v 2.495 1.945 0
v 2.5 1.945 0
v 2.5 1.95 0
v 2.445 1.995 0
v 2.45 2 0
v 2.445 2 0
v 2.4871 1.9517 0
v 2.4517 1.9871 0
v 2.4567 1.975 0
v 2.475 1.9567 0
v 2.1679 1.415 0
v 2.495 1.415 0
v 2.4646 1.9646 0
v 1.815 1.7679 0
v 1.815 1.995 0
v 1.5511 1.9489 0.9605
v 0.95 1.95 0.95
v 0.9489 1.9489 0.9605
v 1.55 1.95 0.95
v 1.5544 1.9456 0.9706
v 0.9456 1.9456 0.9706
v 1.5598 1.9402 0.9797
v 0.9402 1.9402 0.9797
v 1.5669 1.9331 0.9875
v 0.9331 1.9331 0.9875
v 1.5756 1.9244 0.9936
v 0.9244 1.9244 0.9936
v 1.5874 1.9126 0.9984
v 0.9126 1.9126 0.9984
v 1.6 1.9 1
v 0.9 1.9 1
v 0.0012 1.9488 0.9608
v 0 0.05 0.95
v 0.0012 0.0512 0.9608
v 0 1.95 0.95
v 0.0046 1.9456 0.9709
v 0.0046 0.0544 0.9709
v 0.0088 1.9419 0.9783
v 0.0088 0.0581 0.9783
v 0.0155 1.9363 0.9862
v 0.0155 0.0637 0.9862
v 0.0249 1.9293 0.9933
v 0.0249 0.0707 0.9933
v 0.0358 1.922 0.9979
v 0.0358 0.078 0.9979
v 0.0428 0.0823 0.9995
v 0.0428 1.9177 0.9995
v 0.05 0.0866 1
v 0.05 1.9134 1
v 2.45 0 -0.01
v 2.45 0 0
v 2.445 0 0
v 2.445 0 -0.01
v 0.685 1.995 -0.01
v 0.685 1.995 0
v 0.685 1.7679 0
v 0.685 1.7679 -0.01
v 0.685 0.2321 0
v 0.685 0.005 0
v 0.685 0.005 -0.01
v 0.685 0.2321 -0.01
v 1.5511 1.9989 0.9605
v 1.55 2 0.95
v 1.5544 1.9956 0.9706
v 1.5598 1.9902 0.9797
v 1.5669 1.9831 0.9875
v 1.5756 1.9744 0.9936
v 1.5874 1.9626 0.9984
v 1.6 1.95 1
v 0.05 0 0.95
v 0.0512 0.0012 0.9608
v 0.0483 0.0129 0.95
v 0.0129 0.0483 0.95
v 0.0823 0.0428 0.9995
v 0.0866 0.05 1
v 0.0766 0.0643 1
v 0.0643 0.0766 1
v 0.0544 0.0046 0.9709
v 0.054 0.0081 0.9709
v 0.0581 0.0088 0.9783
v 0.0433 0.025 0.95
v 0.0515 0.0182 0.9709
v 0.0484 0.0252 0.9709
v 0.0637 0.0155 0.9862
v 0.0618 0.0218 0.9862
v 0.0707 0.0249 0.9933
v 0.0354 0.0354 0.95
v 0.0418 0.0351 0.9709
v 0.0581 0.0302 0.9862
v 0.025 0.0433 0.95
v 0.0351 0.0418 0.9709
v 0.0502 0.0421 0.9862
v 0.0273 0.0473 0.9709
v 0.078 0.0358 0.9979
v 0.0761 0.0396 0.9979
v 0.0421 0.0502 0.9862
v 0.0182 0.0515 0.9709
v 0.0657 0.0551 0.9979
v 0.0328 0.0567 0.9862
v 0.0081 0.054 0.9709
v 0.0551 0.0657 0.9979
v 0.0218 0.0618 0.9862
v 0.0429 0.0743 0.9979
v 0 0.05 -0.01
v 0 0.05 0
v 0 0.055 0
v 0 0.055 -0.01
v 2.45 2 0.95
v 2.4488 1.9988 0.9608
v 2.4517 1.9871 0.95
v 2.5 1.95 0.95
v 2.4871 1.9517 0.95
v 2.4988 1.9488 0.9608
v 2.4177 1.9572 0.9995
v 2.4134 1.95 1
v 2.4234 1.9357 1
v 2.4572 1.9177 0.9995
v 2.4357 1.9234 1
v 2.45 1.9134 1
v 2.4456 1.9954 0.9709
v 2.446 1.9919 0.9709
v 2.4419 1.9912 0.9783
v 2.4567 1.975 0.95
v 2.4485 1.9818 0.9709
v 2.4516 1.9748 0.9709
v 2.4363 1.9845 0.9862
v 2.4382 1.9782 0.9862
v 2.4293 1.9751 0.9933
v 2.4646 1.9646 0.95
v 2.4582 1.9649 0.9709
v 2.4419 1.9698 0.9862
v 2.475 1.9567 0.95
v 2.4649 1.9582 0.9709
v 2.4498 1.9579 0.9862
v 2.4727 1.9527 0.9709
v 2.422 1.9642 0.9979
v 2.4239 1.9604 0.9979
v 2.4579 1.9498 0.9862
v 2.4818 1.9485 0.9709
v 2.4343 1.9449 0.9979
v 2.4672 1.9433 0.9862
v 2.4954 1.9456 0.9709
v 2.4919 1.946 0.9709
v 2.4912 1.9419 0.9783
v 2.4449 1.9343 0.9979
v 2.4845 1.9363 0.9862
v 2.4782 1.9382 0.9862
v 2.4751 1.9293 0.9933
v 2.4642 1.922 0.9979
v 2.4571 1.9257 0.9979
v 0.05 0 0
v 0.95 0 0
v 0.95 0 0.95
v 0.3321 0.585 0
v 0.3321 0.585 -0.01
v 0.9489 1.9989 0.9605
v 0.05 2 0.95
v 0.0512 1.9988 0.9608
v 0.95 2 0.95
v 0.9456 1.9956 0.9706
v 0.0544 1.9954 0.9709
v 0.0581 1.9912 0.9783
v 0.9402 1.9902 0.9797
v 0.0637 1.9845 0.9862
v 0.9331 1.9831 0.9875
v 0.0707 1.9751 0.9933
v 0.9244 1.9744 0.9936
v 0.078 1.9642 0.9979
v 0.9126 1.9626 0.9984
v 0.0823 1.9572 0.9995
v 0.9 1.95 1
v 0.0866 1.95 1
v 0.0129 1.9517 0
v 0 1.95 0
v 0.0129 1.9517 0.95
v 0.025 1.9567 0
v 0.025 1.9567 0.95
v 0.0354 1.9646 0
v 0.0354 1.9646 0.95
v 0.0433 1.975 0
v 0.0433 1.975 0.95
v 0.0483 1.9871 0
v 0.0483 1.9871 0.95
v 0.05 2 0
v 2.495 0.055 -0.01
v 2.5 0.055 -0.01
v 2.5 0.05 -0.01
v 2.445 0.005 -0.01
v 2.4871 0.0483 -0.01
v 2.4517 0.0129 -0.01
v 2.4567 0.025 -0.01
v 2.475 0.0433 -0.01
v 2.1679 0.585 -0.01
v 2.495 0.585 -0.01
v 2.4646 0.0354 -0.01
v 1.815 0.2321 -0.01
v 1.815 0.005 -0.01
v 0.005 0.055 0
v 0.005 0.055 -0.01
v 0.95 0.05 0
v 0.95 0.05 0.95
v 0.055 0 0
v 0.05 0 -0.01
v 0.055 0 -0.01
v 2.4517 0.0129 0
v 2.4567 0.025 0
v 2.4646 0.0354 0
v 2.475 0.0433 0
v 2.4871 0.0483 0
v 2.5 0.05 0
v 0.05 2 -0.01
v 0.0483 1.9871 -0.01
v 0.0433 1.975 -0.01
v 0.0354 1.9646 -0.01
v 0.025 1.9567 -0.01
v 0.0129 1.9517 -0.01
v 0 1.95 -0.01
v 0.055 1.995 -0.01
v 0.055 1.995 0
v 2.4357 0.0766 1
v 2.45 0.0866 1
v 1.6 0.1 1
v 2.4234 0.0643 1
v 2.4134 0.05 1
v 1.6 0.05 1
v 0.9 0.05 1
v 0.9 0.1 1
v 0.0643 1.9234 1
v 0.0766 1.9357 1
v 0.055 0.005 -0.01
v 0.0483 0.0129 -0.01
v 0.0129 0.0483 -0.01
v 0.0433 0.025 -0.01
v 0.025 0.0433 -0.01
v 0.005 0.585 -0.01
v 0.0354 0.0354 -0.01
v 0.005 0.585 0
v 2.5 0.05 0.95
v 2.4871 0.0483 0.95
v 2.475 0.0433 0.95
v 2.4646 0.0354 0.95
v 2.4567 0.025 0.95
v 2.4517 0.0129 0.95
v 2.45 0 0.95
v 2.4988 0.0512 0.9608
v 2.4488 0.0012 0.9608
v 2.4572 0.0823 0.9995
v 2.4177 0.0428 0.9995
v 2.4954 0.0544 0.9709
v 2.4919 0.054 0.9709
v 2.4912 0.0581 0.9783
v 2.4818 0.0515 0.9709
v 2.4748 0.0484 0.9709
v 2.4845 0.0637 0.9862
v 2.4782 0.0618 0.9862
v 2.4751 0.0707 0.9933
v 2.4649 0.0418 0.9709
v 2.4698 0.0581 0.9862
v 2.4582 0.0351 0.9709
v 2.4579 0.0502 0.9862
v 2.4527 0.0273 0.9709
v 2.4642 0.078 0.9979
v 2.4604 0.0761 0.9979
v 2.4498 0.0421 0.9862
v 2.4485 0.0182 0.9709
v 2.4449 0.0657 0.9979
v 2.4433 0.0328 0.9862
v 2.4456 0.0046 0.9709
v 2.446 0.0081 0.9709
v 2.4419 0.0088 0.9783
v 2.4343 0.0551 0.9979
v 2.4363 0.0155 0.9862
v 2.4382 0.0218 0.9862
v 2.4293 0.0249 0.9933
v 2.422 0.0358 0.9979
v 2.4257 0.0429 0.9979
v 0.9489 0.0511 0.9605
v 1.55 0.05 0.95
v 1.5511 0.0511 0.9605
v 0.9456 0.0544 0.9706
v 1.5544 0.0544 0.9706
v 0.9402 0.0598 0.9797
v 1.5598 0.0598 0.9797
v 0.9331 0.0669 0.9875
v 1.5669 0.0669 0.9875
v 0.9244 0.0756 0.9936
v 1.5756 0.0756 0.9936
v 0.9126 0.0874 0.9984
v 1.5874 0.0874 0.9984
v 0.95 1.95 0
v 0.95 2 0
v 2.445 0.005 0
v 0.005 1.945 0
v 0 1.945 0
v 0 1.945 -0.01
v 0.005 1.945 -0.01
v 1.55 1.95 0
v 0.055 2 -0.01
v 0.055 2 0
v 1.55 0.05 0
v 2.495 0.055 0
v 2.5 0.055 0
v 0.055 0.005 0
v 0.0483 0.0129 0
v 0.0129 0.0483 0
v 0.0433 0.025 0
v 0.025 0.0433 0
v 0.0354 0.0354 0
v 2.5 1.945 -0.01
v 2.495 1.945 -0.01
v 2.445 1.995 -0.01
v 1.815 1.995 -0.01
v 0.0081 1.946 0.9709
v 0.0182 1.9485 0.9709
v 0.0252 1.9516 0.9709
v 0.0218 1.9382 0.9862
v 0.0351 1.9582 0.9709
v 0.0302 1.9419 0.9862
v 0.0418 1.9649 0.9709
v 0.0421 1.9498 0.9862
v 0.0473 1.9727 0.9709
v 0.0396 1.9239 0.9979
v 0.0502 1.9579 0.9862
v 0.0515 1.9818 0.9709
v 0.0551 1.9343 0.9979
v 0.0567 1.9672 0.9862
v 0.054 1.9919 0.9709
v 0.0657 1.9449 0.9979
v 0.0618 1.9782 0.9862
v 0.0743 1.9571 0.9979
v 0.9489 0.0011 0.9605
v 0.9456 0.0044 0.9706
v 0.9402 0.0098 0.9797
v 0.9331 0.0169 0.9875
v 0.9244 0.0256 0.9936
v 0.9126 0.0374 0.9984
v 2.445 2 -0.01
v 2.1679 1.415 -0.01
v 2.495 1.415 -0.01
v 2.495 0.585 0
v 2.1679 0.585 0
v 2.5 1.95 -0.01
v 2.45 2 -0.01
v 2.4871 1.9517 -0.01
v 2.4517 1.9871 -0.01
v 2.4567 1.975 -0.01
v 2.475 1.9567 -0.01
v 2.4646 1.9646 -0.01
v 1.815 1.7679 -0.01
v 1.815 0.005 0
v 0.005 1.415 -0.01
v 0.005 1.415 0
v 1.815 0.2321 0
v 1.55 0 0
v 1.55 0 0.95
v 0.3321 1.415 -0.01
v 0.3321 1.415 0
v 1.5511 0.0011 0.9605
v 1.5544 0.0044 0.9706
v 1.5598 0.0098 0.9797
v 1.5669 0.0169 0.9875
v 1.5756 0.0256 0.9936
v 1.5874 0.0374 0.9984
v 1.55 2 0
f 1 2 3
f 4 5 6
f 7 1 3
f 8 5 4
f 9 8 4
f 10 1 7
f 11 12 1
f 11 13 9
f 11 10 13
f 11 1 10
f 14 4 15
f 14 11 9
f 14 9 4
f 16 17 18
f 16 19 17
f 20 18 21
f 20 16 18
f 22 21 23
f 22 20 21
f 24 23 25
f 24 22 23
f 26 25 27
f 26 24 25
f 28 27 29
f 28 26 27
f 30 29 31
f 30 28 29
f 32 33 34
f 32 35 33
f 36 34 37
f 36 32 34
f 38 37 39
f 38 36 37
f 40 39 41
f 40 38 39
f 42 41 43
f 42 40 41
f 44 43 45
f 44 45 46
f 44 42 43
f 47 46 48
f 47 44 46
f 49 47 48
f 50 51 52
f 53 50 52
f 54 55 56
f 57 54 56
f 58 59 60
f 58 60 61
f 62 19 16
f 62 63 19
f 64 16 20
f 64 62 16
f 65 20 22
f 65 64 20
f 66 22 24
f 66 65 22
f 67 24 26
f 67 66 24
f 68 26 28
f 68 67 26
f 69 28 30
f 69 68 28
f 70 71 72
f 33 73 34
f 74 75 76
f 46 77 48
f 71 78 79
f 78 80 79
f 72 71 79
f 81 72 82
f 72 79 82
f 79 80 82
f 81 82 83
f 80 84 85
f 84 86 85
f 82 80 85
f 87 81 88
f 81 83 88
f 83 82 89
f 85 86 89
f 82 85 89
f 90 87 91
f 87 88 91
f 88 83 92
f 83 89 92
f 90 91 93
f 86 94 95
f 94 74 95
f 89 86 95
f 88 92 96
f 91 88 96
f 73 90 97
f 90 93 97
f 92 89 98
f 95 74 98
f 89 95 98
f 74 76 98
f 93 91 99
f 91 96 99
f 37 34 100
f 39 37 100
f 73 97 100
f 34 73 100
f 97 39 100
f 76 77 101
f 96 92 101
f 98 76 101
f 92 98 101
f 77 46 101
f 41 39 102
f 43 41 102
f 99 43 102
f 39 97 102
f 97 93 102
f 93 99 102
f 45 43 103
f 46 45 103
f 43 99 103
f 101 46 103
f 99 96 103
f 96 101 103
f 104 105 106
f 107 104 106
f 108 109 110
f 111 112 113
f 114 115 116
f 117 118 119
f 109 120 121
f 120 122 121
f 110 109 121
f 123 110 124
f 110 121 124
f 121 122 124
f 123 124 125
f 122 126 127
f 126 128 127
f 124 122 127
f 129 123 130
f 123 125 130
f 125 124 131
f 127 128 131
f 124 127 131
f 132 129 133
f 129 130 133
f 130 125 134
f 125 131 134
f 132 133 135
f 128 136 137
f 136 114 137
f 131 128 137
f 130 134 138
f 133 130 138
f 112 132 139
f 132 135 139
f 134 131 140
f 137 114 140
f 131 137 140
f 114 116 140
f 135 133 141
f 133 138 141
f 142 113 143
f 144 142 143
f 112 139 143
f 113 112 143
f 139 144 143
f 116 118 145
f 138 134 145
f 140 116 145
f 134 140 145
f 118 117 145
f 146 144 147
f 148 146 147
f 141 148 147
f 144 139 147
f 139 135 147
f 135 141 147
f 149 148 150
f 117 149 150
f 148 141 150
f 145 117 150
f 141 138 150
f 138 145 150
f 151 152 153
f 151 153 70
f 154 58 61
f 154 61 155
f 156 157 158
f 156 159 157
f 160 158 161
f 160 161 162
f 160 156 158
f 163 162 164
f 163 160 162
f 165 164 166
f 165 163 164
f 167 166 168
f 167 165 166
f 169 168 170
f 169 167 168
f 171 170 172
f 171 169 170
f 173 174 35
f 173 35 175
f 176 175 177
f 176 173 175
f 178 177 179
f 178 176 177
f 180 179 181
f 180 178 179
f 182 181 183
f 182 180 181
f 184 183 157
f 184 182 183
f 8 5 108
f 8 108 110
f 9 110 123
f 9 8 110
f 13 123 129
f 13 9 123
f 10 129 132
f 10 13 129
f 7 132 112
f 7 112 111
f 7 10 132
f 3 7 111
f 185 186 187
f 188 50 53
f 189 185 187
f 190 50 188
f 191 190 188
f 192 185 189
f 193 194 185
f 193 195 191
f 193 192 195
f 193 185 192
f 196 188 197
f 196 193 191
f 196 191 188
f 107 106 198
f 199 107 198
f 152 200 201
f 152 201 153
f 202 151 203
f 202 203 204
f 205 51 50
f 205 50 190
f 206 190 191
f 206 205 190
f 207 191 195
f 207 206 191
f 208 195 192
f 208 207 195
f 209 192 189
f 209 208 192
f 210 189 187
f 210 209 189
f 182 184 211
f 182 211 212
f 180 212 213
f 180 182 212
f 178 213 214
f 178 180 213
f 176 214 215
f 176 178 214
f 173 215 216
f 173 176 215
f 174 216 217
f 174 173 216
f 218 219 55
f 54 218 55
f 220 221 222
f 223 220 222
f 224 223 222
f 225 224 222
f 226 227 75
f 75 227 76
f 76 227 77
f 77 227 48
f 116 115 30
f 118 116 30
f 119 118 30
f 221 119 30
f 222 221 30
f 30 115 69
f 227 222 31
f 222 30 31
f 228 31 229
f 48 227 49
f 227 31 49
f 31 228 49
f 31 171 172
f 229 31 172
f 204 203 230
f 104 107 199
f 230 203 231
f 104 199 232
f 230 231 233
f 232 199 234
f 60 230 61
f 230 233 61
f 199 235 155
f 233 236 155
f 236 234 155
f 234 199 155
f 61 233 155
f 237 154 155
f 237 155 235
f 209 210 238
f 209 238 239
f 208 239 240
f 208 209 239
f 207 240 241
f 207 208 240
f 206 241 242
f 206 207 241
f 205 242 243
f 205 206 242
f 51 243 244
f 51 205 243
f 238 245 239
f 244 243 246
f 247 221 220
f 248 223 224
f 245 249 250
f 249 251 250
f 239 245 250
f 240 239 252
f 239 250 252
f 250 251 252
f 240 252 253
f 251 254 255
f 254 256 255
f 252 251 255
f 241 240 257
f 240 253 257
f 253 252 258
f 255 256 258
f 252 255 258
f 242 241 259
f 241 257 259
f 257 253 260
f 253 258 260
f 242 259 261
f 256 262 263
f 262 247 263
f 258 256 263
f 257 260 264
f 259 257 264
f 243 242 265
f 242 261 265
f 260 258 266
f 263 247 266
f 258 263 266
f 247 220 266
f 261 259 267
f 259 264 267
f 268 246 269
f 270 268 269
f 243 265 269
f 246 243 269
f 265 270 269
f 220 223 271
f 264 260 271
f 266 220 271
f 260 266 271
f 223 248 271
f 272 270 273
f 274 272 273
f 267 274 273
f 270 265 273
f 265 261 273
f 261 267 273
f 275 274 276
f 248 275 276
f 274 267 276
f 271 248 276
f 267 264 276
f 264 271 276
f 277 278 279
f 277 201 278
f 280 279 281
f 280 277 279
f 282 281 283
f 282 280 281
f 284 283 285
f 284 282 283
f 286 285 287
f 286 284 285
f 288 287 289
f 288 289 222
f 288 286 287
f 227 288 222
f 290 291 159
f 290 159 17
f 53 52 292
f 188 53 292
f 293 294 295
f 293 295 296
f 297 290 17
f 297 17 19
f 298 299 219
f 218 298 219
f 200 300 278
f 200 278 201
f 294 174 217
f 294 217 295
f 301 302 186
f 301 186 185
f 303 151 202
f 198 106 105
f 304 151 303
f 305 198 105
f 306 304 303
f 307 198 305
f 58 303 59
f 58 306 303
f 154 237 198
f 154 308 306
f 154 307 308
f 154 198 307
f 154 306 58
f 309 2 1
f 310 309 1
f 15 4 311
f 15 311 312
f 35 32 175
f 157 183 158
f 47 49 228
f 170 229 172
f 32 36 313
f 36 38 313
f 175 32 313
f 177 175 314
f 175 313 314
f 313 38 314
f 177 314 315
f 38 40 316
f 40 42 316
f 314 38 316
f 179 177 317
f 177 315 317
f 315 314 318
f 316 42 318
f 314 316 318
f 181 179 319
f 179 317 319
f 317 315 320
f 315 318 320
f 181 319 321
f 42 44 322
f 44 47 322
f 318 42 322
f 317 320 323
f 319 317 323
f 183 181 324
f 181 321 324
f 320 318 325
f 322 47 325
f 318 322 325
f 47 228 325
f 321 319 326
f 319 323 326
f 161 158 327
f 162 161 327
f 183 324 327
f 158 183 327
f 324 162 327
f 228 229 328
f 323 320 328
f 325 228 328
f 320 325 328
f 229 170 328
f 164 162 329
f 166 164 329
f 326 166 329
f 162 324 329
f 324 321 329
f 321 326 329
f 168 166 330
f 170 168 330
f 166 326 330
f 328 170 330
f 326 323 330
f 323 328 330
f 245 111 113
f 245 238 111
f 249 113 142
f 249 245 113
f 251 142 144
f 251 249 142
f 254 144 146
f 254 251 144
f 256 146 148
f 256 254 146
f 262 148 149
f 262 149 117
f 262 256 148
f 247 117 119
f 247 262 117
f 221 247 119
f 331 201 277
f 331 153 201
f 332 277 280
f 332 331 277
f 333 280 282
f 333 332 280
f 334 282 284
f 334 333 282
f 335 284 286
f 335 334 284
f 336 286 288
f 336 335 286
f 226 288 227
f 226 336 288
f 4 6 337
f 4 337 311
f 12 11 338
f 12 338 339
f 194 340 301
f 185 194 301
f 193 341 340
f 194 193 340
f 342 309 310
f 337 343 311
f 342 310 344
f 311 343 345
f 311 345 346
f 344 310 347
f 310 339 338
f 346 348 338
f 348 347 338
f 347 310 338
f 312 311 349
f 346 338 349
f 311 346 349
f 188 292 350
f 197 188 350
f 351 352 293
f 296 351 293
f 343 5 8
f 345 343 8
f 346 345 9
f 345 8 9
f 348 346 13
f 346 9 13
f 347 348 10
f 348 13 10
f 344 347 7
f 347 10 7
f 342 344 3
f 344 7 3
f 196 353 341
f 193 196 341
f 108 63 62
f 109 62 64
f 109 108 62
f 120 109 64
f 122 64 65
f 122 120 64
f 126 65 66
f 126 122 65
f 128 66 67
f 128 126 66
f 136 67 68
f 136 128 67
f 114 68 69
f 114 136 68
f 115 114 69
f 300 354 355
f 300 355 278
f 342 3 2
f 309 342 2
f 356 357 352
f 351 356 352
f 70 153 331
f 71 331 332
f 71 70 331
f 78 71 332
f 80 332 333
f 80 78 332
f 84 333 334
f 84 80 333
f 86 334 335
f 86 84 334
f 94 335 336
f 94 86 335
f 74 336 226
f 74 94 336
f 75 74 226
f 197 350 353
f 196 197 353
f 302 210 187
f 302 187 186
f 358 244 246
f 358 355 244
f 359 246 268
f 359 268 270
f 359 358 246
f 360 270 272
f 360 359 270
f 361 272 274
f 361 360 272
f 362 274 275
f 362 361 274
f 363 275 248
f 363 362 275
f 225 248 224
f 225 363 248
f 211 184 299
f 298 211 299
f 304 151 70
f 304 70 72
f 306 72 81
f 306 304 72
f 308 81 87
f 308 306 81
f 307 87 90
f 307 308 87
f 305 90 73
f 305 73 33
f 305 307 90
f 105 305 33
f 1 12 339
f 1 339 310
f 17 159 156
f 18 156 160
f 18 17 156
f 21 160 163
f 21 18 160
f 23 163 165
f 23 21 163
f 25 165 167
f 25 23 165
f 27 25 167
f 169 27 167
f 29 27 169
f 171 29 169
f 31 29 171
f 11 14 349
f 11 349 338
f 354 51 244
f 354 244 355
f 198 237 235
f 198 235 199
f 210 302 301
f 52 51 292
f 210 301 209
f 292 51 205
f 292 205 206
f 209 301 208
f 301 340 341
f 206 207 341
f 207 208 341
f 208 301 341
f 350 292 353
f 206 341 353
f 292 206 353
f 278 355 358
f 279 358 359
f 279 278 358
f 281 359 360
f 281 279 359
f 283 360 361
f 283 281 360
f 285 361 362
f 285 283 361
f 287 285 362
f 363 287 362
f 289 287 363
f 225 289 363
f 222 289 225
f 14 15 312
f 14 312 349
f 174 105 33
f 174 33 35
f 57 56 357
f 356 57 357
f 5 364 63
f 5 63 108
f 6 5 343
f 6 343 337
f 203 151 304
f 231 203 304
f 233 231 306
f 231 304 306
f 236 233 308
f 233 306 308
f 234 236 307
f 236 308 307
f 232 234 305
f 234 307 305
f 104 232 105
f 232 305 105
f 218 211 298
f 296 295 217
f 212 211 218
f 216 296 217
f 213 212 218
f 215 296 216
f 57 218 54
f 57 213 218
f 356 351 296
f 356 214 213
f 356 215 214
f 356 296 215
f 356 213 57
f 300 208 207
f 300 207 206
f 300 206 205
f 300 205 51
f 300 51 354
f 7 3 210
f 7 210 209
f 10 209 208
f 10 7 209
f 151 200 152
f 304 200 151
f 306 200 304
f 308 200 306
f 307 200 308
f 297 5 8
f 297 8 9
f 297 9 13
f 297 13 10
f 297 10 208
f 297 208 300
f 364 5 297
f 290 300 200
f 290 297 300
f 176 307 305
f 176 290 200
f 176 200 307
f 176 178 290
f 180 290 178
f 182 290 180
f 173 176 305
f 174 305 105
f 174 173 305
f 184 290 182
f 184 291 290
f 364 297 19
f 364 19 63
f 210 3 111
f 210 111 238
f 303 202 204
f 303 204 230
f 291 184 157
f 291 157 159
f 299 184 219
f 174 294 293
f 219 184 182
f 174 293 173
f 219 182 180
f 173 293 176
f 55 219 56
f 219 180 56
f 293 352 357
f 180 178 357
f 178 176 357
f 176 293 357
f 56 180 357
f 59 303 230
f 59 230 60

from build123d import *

# Parameters (mm, degrees)
EXTRUDE_DEPTH    = 1
FILLET_R         = 0.05
EXTRUDE001_DEPTH = 0.01
EXTRUDE002_DEPTH = 0.01
EXTRUDE003_DEPTH = 0.01
EXTRUDE004_DEPTH = 0.01


with BuildPart() as fillet_body:
    # Sketch → Extrude (new body)
    with BuildSketch(Plane.XY):
        with BuildLine():
            Line((0.95, 2), (0.95, 1.95))
            Line((0.95, 1.95), (1.55, 1.95))
            Line((1.55, 1.95), (1.55, 2))
            Line((1.55, 2), (2.45, 2))
            ThreePointArc((2.45, 2), (2.464645, 1.964645), (2.5, 1.95))
            Line((2.5, 1.95), (2.5, 0.05))
            ThreePointArc((2.5, 0.05), (2.464645, 0.035355), (2.45, 0))
            Line((2.45, 0), (1.55, 0))
            Line((1.55, 0), (1.55, 0.05))
            Line((1.55, 0.05), (0.95, 0.05))
            Line((0.95, 0.05), (0.95, 0))
            Line((0.95, 0), (0.05, 0))
            ThreePointArc((0.05, 0), (0.035355, 0.035355), (0, 0.05))
            Line((0, 0.05), (0, 1.95))
            ThreePointArc((0, 1.95), (0.035355, 1.964645), (0.05, 2))
            Line((0.05, 2), (0.95, 2))
        make_face()
    extrude(amount=EXTRUDE_DEPTH)

    # Fillet
    fillet_edges = [fillet_body.edges().sort_by_distance(p)[0] for p in [
        (0.95, 1.975, 1),
        (1.25, 1.95, 1),
        (1.55, 1.975, 1),
        (2, 2, 1),
        (2.464645, 1.964645, 1),
        (2.5, 1, 1),
        (2.464645, 0.035355, 1),
        (2, 0, 1),
        (1.55, 0.025, 1),
        (1.25, 0.05, 1),
        (0.95, 0.025, 1),
        (0.5, 0, 1),
        (0.035355, 0.035355, 1),
        (0, 1, 1),
        (0.035355, 1.964645, 1),
        (0.5, 2, 1),
    ]]
    fillet(fillet_edges, radius=FILLET_R)


with BuildPart() as extrude001:
    # Sketch001 → Extrude001 (new body)
    with BuildSketch(Plane.XY):
        with BuildLine():
            Line((0.055, 0), (0.055, 0.005))
            Line((0.055, 0.005), (0.685, 0.005))
            Line((0.685, 0.005), (0.685, 0.232124))
            Line((0.685, 0.232124), (0.332124, 0.585))
            Line((0.332124, 0.585), (0.005, 0.585))
            Line((0.005, 0.585), (0.005, 0.055))
            Line((0, 0.055), (0.005, 0.055))
            Line((0, 0.05), (0, 0.055))
            ThreePointArc((0.05, 0), (0.035355, 0.035355), (0, 0.05))
            Line((0.05, 0), (0.055, 0))
        make_face()
    extrude(amount=-EXTRUDE001_DEPTH)


with BuildPart() as extrude002:
    # Sketch002 → Extrude002 (new body)
    with BuildSketch(Plane.XY):
        with BuildLine():
            Line((0.055, 0), (0.055, 0.005))
            Line((0.055, 0.005), (0.685, 0.005))
            Line((0.685, 0.005), (0.685, 0.232124))
            Line((0.685, 0.232124), (0.332124, 0.585))
            Line((0.332124, 0.585), (0.005, 0.585))
            Line((0.005, 0.585), (0.005, 0.055))
            Line((0, 0.055), (0.005, 0.055))
            Line((0, 0.05), (0, 0.055))
            ThreePointArc((0.05, 0), (0.035355, 0.035355), (0, 0.05))
            Line((0.05, 0), (0.055, 0))
        make_face()
    extrude(amount=-EXTRUDE002_DEPTH)


with BuildPart() as part_mirroring:
    # Part__Mirroring: instance of Extrude002
    add(extrude002.part.mirror(Plane(origin=(1.25, 0, 0), x_dir=(0, -1, 0), z_dir=(1, 0, 0))))


with BuildPart() as extrude003:
    # Sketch003 → Extrude003 (new body)
    with BuildSketch(Plane.XY):
        with BuildLine():
            Line((0.055, 0), (0.055, 0.005))
            Line((0.055, 0.005), (0.685, 0.005))
            Line((0.685, 0.005), (0.685, 0.232124))
            Line((0.685, 0.232124), (0.332124, 0.585))
            Line((0.332124, 0.585), (0.005, 0.585))
            Line((0.005, 0.585), (0.005, 0.055))
            Line((0, 0.055), (0.005, 0.055))
            Line((0, 0.05), (0, 0.055))
            ThreePointArc((0.05, 0), (0.035355, 0.035355), (0, 0.05))
            Line((0.05, 0), (0.055, 0))
        make_face()
    extrude(amount=-EXTRUDE003_DEPTH)


with BuildPart() as part_mirroring002:
    # Part__Mirroring002: instance of Extrude003
    add(extrude003.part.mirror(Plane(origin=(0, 1, 0), x_dir=(1, 0, 0), z_dir=(0, 1, 0))))


with BuildPart() as extrude004:
    # Sketch004 → Extrude004 (new body)
    with BuildSketch(Plane.XY):
        with BuildLine():
            Line((0.055, 0), (0.055, 0.005))
            Line((0.055, 0.005), (0.685, 0.005))
            Line((0.685, 0.005), (0.685, 0.232124))
            Line((0.685, 0.232124), (0.332124, 0.585))
            Line((0.332124, 0.585), (0.005, 0.585))
            Line((0.005, 0.585), (0.005, 0.055))
            Line((0, 0.055), (0.005, 0.055))
            Line((0, 0.05), (0, 0.055))
            ThreePointArc((0.05, 0), (0.035355, 0.035355), (0, 0.05))
            Line((0.05, 0), (0.055, 0))
        make_face()
    extrude(amount=-EXTRUDE004_DEPTH)


with BuildPart() as part_mirroring001:
    # Part__Mirroring001: instance of Extrude004
    add(extrude004.part.mirror(Plane(origin=(1.25, 0, 0), x_dir=(0, -1, 0), z_dir=(1, 0, 0))))


with BuildPart() as part_mirroring003:
    # Part__Mirroring003: instance of Part__Mirroring001
    add(part_mirroring001.part.mirror(Plane(origin=(0, 1, 0), x_dir=(1, 0, 0), z_dir=(0, 1, 0))))


solid = Compound([fillet_body.part, extrude001.part, part_mirroring.part, part_mirroring002.part, part_mirroring003.part])
